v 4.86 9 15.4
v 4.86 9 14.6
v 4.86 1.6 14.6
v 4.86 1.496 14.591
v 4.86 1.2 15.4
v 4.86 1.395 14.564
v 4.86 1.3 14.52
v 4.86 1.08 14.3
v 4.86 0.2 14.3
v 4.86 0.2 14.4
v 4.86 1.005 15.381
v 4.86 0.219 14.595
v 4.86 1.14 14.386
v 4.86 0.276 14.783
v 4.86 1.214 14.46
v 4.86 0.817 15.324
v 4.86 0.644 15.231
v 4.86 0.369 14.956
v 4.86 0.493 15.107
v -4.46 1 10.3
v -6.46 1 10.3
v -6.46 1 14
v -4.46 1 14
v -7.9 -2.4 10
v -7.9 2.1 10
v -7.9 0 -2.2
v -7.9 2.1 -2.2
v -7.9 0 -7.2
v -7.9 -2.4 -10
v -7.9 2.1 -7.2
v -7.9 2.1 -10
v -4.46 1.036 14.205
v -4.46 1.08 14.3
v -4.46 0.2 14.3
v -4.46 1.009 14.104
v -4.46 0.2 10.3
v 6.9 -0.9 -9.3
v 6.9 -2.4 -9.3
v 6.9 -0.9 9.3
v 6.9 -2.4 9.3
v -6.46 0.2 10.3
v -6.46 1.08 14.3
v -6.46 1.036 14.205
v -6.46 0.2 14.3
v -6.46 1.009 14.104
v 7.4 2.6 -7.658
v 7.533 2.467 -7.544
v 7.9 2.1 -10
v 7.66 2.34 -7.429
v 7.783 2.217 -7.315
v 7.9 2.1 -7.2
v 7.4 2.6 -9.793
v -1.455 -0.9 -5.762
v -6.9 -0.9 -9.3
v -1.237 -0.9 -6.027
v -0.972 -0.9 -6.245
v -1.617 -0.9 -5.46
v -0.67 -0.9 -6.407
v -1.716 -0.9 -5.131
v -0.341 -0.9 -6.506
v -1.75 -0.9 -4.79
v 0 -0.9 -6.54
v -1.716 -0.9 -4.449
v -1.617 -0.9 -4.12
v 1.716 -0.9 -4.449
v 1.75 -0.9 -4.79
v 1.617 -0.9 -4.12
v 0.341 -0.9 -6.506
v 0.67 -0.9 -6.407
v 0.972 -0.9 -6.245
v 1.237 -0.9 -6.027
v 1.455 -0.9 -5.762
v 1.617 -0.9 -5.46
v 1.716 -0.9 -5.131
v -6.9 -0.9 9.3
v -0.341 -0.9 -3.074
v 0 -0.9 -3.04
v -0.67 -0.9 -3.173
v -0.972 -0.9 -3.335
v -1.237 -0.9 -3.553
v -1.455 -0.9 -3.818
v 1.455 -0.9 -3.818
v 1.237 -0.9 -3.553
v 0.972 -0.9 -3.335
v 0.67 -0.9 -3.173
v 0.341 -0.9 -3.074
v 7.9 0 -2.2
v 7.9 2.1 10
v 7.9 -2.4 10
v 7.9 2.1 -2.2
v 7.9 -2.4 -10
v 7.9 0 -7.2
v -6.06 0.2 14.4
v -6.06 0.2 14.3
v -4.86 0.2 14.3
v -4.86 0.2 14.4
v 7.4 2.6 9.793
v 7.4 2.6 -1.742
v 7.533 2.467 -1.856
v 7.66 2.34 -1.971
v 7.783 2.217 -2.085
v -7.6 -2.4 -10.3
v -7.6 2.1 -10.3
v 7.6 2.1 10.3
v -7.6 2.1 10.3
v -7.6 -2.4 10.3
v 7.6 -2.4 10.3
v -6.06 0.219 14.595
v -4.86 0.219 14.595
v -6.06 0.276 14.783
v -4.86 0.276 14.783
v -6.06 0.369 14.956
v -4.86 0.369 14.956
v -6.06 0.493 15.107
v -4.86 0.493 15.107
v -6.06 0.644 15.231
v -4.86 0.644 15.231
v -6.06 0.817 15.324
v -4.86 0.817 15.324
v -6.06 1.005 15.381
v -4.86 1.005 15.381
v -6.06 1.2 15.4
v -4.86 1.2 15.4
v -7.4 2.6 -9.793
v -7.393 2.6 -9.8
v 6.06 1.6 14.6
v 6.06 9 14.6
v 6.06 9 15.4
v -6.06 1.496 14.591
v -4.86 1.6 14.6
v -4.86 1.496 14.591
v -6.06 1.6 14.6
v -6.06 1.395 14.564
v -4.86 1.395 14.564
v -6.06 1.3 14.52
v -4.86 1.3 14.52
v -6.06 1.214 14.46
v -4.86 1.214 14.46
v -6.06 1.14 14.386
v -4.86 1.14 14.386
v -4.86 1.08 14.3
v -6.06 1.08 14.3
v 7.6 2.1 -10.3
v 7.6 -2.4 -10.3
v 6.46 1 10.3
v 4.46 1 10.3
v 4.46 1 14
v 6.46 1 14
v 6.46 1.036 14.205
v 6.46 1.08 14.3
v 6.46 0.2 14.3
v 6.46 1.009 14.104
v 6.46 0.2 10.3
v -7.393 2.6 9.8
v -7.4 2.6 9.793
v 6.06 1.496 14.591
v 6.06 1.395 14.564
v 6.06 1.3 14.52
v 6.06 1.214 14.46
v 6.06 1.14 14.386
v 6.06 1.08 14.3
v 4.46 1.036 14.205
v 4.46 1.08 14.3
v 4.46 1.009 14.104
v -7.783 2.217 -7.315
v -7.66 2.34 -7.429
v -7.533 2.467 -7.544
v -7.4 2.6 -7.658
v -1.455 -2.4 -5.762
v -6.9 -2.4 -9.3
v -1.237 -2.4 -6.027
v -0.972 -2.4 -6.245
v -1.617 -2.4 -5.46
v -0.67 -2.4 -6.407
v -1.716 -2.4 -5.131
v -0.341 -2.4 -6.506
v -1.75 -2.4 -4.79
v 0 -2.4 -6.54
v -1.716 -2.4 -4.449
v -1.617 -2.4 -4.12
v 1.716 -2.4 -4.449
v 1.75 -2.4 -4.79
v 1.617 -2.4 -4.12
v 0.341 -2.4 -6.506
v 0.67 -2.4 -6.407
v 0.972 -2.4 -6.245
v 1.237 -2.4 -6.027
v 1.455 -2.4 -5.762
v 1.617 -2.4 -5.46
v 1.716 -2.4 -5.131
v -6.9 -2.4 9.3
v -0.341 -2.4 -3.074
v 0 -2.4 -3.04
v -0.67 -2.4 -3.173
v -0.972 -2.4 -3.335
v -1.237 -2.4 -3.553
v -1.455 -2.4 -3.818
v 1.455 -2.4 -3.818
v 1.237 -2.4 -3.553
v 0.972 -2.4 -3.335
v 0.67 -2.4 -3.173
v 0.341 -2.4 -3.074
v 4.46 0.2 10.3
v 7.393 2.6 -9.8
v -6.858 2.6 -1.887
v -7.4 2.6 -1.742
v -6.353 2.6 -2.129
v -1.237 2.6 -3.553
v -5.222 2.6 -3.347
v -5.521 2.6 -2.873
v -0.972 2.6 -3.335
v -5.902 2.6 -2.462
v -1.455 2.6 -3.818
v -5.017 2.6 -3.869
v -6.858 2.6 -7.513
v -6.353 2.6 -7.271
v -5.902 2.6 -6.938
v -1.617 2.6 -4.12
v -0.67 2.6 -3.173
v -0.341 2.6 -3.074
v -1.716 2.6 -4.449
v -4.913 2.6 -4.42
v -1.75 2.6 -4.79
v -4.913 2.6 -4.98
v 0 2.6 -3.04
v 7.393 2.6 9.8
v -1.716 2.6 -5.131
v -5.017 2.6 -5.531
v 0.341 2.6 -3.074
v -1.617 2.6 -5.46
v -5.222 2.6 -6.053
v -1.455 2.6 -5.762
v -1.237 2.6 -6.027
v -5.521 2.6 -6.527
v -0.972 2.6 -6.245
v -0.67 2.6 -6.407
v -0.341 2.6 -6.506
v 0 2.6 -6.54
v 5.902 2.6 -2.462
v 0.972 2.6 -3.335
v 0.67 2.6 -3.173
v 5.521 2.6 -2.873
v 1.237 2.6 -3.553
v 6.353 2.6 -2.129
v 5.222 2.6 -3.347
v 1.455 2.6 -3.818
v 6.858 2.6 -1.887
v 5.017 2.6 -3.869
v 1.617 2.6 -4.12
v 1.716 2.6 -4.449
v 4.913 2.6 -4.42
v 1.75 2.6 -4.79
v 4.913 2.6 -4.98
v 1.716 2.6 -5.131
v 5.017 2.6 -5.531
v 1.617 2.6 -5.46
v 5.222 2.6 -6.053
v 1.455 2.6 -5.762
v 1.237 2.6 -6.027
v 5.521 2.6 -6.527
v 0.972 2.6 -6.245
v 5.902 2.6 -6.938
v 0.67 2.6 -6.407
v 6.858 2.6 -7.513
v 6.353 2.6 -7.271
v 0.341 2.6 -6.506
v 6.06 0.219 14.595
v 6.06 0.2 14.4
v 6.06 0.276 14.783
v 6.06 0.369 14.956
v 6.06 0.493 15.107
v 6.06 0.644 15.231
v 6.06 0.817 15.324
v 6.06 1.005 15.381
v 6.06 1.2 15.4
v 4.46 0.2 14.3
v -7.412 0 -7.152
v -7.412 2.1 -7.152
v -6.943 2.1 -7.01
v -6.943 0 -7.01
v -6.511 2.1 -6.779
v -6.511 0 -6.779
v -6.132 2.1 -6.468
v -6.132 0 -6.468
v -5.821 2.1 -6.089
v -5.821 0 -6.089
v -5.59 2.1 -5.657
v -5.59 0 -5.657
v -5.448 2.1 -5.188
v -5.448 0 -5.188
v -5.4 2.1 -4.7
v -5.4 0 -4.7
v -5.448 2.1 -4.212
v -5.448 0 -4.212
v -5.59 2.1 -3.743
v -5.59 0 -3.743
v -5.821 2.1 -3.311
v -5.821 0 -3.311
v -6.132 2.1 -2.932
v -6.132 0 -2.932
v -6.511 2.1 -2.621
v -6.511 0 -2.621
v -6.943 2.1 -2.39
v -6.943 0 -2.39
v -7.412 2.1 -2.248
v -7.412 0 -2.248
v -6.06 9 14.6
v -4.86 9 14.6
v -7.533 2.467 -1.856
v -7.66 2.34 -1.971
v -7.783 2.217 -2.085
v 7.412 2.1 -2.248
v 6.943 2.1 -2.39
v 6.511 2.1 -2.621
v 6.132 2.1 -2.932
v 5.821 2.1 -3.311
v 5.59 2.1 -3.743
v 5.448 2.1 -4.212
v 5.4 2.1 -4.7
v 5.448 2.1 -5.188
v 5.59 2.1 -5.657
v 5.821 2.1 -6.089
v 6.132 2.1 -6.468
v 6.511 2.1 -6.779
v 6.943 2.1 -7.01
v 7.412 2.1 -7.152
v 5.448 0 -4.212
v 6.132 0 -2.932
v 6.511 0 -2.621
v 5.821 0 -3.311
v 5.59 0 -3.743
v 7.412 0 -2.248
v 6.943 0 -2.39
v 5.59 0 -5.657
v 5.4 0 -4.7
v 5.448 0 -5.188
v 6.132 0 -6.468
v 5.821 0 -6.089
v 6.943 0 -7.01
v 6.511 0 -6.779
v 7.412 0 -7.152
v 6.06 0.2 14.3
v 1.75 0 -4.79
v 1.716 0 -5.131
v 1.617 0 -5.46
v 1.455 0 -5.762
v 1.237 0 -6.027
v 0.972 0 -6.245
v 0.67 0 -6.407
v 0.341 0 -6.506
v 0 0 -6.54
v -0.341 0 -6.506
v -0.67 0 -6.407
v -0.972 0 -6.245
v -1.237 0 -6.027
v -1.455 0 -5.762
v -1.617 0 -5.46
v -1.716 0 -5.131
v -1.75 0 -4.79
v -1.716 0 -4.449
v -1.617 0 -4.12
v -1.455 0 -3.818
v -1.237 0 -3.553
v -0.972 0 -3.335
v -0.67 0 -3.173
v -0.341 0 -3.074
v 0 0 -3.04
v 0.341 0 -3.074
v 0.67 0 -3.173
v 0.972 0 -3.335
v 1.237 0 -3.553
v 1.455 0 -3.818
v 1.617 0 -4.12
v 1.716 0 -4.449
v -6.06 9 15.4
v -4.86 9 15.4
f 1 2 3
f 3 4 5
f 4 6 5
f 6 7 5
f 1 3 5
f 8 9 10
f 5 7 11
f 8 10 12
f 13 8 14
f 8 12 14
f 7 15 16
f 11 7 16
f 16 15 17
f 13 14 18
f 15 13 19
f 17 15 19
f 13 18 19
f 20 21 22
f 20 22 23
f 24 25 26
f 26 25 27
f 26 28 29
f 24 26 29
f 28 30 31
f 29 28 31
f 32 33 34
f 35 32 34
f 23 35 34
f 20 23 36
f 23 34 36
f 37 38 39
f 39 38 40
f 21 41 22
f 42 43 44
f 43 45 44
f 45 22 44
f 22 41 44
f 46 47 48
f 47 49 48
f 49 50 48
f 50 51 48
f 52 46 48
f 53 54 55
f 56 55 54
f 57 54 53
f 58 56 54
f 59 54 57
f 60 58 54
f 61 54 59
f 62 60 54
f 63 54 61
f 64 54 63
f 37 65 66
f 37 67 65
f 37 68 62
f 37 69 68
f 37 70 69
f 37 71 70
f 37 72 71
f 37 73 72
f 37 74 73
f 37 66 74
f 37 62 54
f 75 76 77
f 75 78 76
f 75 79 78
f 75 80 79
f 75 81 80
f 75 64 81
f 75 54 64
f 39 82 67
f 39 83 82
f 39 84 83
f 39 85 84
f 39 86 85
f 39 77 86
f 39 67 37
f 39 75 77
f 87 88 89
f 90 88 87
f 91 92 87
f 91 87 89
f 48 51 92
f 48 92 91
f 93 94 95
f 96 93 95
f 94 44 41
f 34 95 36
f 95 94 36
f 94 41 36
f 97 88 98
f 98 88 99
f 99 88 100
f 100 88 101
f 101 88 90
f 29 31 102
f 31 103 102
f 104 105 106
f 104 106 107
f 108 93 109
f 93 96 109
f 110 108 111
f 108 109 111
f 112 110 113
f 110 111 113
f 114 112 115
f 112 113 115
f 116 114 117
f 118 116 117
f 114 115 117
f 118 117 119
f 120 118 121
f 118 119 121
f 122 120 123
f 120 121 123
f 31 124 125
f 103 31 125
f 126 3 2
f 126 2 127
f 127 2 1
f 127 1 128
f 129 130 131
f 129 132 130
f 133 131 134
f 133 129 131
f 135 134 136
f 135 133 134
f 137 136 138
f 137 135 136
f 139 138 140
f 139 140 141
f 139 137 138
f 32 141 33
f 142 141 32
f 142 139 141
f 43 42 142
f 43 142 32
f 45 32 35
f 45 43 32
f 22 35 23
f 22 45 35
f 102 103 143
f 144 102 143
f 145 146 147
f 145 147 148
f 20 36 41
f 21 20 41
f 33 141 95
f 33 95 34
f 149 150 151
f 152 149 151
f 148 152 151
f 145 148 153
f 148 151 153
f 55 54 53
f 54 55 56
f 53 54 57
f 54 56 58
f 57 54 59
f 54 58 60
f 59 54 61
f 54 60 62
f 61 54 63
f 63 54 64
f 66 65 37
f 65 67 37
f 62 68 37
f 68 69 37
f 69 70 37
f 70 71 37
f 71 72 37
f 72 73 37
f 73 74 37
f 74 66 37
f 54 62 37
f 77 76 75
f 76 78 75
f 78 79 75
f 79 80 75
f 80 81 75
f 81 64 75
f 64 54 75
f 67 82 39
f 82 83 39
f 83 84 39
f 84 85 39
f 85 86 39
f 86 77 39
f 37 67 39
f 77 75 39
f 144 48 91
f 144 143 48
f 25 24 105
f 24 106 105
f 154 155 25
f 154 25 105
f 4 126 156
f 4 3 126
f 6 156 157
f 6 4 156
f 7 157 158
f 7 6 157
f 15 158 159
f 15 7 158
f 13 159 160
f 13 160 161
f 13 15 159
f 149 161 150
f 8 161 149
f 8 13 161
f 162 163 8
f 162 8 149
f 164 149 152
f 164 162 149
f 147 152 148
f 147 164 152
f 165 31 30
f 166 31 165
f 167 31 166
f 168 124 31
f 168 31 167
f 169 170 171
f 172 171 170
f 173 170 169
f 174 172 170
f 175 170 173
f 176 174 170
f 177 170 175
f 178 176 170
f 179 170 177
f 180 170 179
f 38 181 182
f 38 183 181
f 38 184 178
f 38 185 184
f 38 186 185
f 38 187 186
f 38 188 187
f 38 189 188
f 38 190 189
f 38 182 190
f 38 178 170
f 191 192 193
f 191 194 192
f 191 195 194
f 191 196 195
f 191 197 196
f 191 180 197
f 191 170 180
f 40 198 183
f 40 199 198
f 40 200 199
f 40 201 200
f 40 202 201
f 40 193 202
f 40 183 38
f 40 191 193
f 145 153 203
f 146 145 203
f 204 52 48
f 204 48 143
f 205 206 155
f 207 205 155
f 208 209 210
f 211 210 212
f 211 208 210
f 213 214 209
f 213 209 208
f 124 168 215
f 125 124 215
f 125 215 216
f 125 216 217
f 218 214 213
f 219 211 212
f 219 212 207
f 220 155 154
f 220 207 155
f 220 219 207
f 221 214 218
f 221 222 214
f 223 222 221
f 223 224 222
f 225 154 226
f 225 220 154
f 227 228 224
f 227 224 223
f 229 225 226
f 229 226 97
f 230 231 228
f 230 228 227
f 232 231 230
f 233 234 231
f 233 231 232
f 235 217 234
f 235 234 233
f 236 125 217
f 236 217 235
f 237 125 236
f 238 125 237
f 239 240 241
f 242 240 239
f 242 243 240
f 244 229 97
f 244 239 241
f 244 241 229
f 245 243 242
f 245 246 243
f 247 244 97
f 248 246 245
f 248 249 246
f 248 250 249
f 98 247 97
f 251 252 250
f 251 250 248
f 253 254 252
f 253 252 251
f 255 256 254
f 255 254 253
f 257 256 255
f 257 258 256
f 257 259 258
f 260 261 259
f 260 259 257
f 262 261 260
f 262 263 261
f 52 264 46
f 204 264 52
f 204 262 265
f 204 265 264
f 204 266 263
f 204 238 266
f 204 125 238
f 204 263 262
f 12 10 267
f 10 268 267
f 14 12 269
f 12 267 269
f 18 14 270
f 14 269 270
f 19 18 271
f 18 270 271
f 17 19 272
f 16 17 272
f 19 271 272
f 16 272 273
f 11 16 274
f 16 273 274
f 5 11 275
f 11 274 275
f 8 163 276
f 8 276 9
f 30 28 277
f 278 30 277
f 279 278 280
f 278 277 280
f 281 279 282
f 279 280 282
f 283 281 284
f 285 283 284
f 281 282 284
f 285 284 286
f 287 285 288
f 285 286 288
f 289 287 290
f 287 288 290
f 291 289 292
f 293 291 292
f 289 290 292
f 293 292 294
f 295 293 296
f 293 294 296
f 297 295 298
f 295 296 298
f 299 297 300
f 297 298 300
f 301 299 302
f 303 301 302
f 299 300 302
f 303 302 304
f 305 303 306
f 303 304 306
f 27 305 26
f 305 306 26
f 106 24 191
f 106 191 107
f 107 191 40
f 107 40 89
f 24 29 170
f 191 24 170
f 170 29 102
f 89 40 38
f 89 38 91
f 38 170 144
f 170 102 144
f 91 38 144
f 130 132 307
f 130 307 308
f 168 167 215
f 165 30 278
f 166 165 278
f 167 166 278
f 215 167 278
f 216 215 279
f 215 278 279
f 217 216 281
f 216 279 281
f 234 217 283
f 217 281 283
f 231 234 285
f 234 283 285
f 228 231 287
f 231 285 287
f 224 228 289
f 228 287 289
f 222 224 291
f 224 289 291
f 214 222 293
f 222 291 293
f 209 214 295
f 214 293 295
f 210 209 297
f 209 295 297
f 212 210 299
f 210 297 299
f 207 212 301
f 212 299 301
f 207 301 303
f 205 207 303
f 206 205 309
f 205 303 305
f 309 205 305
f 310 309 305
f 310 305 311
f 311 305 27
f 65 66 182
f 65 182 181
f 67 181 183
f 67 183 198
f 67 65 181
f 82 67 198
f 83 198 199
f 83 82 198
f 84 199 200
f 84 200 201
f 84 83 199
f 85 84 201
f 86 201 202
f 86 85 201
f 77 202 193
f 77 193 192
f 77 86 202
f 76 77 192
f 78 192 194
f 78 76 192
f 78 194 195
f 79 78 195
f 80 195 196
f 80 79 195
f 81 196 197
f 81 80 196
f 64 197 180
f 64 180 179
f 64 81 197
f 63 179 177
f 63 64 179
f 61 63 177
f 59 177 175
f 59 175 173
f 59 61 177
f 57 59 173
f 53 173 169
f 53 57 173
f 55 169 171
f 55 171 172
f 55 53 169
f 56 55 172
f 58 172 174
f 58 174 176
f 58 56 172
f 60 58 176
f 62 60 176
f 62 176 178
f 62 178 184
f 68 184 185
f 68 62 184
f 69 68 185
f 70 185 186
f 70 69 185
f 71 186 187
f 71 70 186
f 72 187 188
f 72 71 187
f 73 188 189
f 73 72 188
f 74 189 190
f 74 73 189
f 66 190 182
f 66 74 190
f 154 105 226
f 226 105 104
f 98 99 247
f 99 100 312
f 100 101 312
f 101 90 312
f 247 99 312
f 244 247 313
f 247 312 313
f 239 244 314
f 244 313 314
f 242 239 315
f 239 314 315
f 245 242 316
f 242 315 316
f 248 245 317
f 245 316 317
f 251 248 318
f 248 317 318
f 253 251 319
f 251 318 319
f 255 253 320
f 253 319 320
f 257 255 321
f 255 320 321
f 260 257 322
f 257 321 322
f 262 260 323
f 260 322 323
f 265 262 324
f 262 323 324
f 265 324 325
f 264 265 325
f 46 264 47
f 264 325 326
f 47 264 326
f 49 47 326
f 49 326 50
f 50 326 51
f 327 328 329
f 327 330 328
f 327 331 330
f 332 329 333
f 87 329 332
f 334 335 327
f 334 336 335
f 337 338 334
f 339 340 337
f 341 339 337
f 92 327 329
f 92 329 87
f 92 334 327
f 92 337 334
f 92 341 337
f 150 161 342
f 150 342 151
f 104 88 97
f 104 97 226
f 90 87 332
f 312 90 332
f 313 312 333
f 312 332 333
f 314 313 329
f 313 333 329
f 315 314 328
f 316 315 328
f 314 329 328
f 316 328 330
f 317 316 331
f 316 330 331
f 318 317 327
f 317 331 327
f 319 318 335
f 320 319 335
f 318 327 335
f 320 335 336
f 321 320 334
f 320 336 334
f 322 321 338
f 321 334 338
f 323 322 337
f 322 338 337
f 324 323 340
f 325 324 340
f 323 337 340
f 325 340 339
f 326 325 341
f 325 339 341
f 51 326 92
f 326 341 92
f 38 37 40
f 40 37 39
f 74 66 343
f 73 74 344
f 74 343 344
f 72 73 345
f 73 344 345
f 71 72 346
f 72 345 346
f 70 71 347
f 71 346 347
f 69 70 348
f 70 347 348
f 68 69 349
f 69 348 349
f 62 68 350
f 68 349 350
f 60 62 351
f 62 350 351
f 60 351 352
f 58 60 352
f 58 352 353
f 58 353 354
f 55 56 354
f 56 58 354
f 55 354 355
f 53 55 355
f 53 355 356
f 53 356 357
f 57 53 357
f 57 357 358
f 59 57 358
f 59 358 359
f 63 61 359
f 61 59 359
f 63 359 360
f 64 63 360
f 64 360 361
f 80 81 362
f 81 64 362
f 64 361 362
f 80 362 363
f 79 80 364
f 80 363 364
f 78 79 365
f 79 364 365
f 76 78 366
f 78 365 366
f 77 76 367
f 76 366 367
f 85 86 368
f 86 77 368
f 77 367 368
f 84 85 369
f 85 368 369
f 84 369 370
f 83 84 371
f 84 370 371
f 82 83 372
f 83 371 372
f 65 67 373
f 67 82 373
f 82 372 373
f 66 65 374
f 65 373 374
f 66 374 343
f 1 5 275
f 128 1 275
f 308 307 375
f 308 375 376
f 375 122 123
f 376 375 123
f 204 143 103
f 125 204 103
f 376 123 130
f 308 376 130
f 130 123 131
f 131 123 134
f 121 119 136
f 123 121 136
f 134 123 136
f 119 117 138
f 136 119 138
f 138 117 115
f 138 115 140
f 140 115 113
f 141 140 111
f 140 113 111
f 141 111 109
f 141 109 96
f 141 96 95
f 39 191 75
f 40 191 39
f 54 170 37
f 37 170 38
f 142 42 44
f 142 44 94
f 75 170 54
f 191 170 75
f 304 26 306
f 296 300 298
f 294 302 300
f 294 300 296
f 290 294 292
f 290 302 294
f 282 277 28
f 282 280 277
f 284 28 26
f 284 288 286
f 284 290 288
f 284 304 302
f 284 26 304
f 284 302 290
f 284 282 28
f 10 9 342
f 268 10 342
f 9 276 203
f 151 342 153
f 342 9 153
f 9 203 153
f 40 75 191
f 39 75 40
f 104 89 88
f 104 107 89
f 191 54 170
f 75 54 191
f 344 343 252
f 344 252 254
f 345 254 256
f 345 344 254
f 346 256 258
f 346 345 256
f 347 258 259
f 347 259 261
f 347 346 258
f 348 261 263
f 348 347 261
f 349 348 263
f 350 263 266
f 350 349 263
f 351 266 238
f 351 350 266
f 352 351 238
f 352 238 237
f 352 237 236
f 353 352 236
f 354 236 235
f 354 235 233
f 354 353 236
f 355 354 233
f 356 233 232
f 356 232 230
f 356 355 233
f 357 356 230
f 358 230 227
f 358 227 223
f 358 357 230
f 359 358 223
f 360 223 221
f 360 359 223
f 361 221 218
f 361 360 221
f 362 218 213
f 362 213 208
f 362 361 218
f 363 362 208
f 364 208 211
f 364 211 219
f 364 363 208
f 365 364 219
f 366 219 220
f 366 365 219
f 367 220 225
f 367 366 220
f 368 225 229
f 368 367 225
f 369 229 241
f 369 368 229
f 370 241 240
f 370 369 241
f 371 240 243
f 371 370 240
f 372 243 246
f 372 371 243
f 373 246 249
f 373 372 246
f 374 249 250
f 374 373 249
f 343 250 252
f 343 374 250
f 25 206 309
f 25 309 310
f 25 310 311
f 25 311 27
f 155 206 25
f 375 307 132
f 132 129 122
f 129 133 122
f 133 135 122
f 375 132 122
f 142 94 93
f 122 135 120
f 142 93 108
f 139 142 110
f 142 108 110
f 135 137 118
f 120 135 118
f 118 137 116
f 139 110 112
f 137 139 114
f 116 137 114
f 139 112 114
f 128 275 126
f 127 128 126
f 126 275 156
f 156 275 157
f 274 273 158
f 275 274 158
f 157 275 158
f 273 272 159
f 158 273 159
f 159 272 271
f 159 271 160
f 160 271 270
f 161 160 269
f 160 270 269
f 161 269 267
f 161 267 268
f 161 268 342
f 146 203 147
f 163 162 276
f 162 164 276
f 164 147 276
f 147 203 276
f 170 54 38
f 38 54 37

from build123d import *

# Parameters (mm, degrees)
SKETCH_1_R          = 1.75
EXTRUDE_1_DEPTH     = 2.6
SKETCH_1_3_W        = 15.8
SKETCH_1_3_H        = 20.6
SKETCH_1_3_R        = 1.75
EXTRUDE_2_DEPTH     = 2.4
EXTRUDE_START       = 0.2
SKETCH_1_4_W        = 1.2
SKETCH_1_4_H        = 0.3
SKETCH_1_4_H_2      = 0.8
EXTRUDE_3_DEPTH     = 0.8
SKETCH_1_5_W        = 1.2
SKETCH_1_5_H        = 0.8
EXTRUDE_4_DEPTH     = 8.8
FILLET_1_R          = 1
FILLET_2_R          = 1
FILLET_3_R          = 0.6
FILLET_4_R          = 0.6
CHAMFER_1_SIZE      = 0.3
CHAMFER_2_SIZE      = 0.5
SKETCH_2_W          = 13.8
SKETCH_2_H          = 18.6
SKETCH_2_R          = 1.75
CUT_EXTRUDE_1_DEPTH = 1.5
EXTRUDE_START_2     = -1.5
SKETCH_2_3_W        = 13.8
SKETCH_2_3_H        = 18.6
SKETCH_2_3_R        = 1.75
EXTRUDE_5_DEPTH     = 1.5


with BuildPart() as part:
    # Эскиз1 → Бобышка-Вытянуть1 (new body)
    with BuildSketch(Plane(origin=(0, 0, 0), x_dir=(1, 0, 0), z_dir=(0, 1, 0))):
        with BuildLine():
            Line((6.46, -10.3), (7.9, -10.3))
            Line((7.9, -10.3), (7.9, 2.2))
            ThreePointArc((7.9, 2.2), (5.4, 4.7), (7.9, 7.2))
            Line((7.9, 7.2), (7.9, 10.3))
            Line((7.9, 10.3), (-7.9, 10.3))
            Line((-7.9, 10.3), (-7.9, 7.2))
            ThreePointArc((-7.9, 7.2), (-5.4, 4.7), (-7.9, 2.2))
            Line((-7.9, 2.2), (-7.9, -10.3))
            Line((-7.9, -10.3), (-6.46, -10.3))
            Line((-6.46, -10.3), (-4.46, -10.3))
            Line((-4.46, -10.3), (4.46, -10.3))
            Line((4.46, -10.3), (6.46, -10.3))
        make_face()
        with Locations((0, 4.79)):
            Circle(SKETCH_1_R, mode=Mode.SUBTRACT)
    extrude(amount=EXTRUDE_1_DEPTH)

    # Эскиз1<3> → Бобышка-Вытянуть2 (add)
    with BuildSketch(Plane(origin=(0, 0, 0), x_dir=(1, 0, 0), z_dir=(0, 1, 0))):
        Rectangle(SKETCH_1_3_W, SKETCH_1_3_H)
        with Locations((0, 4.79)):
            Circle(SKETCH_1_3_R, mode=Mode.SUBTRACT)
    extrude(amount=-EXTRUDE_2_DEPTH)

    # Фаска1
    chamfer_1_edges = [part.edges().sort_by_distance(p)[0] for p in [
        (7.9, 0.1, 10.3),
        (-7.9, 0.1, 10.3),
        (-7.9, 0.1, -10.3),
        (7.9, 0.1, -10.3),
    ]]
    chamfer(chamfer_1_edges, length=CHAMFER_1_SIZE)

    # Фаска2
    chamfer_2_edges = [part.edges().sort_by_distance(p)[0] for p in [
        (5.4, 2.6, -4.7),
        (7.9, 2.6, -8.6),
        (-7.9, 2.6, -8.6),
        (-5.4, 2.6, -4.7),
        (0, 2.6, 10.3),
        (-7.9, 2.6, 3.9),
        (7.9, 2.6, 3.9),
        (0, 2.6, -10.3),
        (7.75, 2.6, 10.15),
        (7.75, 2.6, -10.15),
        (-7.75, 2.6, -10.15),
        (-7.75, 2.6, 10.15),
    ]]
    chamfer(chamfer_2_edges, length=CHAMFER_2_SIZE)

    # Эскиз2 → Вырез-Вытянуть1 (cut)
    with BuildSketch(Plane.XZ.offset(2.4)):
        Rectangle(SKETCH_2_W, SKETCH_2_H)
        with Locations((0, -4.79)):
            Circle(SKETCH_2_R, mode=Mode.SUBTRACT)
    extrude(amount=-CUT_EXTRUDE_1_DEPTH, mode=Mode.SUBTRACT)


with BuildPart() as body_2:
    # Эскиз1<4> → Бобышка-Вытянуть3 (new body)
    with BuildSketch(Plane(origin=(0, 0, 0), x_dir=(1, 0, 0), z_dir=(0, 1, 0)).offset(EXTRUDE_START)):
        Polygon((-4.46, -14.3), (-4.46, -10.3), (-6.46, -10.3), (-6.46, -14.3), (-6.06, -14.3), (-4.86, -14.3), align=None)
        with Locations((-5.46, -14.45)):
            Rectangle(SKETCH_1_4_W, SKETCH_1_4_H)
        with Locations((-5.46, -15)):
            Rectangle(SKETCH_1_4_W, SKETCH_1_4_H_2)
        Polygon((6.46, -14.3), (6.46, -10.3), (4.46, -10.3), (4.46, -14.3), (4.86, -14.3), (6.06, -14.3), align=None)
        with Locations((5.46, -14.45)):
            Rectangle(SKETCH_1_4_W, SKETCH_1_4_H)
        with Locations((5.46, -15)):
            Rectangle(SKETCH_1_4_W, SKETCH_1_4_H_2)
    extrude(amount=EXTRUDE_3_DEPTH)

    # Эскиз1<5> → Бобышка-Вытянуть4 (add)
    with BuildSketch(Plane(origin=(0, 0, 0), x_dir=(1, 0, 0), z_dir=(0, 1, 0)).offset(EXTRUDE_START)):
        with Locations((-5.46, -15)):
            Rectangle(SKETCH_1_5_W, SKETCH_1_5_H)
        with Locations((5.46, -15)):
            Rectangle(SKETCH_1_5_W, SKETCH_1_5_H)
    extrude(amount=EXTRUDE_4_DEPTH)

    # Скругление1
    fillet_1_edges = [body_2.edges().sort_by_distance(p)[0] for p in [
        (-5.46, 0.2, 15.4),
    ]]
    fillet(fillet_1_edges, radius=FILLET_1_R)

    # Скругление2
    fillet_2_edges = [body_2.edges().sort_by_distance(p)[0] for p in [
        (5.46, 0.2, 15.4),
    ]]
    fillet(fillet_2_edges, radius=FILLET_2_R)

    # Скругление3
    fillet_3_edges = [body_2.edges().sort_by_distance(p)[0] for p in [
        (-5.46, 1, 14.6),
    ]]
    fillet(fillet_3_edges, radius=FILLET_3_R)

    # Скругление4
    fillet_4_edges = [body_2.edges().sort_by_distance(p)[0] for p in [
        (5.46, 1, 14.6),
    ]]
    fillet(fillet_4_edges, radius=FILLET_4_R)


with BuildPart() as body_3:
    # Эскиз2<3> → Бобышка-Вытянуть5 (new body)
    with BuildSketch(Plane.XZ.offset(2.4).offset(EXTRUDE_START_2)):
        Rectangle(SKETCH_2_3_W, SKETCH_2_3_H)
        with Locations((0, -4.79)):
            Circle(SKETCH_2_3_R, mode=Mode.SUBTRACT)
    extrude(amount=EXTRUDE_5_DEPTH)


solid = Compound([part.part, body_2.part, body_3.part])
